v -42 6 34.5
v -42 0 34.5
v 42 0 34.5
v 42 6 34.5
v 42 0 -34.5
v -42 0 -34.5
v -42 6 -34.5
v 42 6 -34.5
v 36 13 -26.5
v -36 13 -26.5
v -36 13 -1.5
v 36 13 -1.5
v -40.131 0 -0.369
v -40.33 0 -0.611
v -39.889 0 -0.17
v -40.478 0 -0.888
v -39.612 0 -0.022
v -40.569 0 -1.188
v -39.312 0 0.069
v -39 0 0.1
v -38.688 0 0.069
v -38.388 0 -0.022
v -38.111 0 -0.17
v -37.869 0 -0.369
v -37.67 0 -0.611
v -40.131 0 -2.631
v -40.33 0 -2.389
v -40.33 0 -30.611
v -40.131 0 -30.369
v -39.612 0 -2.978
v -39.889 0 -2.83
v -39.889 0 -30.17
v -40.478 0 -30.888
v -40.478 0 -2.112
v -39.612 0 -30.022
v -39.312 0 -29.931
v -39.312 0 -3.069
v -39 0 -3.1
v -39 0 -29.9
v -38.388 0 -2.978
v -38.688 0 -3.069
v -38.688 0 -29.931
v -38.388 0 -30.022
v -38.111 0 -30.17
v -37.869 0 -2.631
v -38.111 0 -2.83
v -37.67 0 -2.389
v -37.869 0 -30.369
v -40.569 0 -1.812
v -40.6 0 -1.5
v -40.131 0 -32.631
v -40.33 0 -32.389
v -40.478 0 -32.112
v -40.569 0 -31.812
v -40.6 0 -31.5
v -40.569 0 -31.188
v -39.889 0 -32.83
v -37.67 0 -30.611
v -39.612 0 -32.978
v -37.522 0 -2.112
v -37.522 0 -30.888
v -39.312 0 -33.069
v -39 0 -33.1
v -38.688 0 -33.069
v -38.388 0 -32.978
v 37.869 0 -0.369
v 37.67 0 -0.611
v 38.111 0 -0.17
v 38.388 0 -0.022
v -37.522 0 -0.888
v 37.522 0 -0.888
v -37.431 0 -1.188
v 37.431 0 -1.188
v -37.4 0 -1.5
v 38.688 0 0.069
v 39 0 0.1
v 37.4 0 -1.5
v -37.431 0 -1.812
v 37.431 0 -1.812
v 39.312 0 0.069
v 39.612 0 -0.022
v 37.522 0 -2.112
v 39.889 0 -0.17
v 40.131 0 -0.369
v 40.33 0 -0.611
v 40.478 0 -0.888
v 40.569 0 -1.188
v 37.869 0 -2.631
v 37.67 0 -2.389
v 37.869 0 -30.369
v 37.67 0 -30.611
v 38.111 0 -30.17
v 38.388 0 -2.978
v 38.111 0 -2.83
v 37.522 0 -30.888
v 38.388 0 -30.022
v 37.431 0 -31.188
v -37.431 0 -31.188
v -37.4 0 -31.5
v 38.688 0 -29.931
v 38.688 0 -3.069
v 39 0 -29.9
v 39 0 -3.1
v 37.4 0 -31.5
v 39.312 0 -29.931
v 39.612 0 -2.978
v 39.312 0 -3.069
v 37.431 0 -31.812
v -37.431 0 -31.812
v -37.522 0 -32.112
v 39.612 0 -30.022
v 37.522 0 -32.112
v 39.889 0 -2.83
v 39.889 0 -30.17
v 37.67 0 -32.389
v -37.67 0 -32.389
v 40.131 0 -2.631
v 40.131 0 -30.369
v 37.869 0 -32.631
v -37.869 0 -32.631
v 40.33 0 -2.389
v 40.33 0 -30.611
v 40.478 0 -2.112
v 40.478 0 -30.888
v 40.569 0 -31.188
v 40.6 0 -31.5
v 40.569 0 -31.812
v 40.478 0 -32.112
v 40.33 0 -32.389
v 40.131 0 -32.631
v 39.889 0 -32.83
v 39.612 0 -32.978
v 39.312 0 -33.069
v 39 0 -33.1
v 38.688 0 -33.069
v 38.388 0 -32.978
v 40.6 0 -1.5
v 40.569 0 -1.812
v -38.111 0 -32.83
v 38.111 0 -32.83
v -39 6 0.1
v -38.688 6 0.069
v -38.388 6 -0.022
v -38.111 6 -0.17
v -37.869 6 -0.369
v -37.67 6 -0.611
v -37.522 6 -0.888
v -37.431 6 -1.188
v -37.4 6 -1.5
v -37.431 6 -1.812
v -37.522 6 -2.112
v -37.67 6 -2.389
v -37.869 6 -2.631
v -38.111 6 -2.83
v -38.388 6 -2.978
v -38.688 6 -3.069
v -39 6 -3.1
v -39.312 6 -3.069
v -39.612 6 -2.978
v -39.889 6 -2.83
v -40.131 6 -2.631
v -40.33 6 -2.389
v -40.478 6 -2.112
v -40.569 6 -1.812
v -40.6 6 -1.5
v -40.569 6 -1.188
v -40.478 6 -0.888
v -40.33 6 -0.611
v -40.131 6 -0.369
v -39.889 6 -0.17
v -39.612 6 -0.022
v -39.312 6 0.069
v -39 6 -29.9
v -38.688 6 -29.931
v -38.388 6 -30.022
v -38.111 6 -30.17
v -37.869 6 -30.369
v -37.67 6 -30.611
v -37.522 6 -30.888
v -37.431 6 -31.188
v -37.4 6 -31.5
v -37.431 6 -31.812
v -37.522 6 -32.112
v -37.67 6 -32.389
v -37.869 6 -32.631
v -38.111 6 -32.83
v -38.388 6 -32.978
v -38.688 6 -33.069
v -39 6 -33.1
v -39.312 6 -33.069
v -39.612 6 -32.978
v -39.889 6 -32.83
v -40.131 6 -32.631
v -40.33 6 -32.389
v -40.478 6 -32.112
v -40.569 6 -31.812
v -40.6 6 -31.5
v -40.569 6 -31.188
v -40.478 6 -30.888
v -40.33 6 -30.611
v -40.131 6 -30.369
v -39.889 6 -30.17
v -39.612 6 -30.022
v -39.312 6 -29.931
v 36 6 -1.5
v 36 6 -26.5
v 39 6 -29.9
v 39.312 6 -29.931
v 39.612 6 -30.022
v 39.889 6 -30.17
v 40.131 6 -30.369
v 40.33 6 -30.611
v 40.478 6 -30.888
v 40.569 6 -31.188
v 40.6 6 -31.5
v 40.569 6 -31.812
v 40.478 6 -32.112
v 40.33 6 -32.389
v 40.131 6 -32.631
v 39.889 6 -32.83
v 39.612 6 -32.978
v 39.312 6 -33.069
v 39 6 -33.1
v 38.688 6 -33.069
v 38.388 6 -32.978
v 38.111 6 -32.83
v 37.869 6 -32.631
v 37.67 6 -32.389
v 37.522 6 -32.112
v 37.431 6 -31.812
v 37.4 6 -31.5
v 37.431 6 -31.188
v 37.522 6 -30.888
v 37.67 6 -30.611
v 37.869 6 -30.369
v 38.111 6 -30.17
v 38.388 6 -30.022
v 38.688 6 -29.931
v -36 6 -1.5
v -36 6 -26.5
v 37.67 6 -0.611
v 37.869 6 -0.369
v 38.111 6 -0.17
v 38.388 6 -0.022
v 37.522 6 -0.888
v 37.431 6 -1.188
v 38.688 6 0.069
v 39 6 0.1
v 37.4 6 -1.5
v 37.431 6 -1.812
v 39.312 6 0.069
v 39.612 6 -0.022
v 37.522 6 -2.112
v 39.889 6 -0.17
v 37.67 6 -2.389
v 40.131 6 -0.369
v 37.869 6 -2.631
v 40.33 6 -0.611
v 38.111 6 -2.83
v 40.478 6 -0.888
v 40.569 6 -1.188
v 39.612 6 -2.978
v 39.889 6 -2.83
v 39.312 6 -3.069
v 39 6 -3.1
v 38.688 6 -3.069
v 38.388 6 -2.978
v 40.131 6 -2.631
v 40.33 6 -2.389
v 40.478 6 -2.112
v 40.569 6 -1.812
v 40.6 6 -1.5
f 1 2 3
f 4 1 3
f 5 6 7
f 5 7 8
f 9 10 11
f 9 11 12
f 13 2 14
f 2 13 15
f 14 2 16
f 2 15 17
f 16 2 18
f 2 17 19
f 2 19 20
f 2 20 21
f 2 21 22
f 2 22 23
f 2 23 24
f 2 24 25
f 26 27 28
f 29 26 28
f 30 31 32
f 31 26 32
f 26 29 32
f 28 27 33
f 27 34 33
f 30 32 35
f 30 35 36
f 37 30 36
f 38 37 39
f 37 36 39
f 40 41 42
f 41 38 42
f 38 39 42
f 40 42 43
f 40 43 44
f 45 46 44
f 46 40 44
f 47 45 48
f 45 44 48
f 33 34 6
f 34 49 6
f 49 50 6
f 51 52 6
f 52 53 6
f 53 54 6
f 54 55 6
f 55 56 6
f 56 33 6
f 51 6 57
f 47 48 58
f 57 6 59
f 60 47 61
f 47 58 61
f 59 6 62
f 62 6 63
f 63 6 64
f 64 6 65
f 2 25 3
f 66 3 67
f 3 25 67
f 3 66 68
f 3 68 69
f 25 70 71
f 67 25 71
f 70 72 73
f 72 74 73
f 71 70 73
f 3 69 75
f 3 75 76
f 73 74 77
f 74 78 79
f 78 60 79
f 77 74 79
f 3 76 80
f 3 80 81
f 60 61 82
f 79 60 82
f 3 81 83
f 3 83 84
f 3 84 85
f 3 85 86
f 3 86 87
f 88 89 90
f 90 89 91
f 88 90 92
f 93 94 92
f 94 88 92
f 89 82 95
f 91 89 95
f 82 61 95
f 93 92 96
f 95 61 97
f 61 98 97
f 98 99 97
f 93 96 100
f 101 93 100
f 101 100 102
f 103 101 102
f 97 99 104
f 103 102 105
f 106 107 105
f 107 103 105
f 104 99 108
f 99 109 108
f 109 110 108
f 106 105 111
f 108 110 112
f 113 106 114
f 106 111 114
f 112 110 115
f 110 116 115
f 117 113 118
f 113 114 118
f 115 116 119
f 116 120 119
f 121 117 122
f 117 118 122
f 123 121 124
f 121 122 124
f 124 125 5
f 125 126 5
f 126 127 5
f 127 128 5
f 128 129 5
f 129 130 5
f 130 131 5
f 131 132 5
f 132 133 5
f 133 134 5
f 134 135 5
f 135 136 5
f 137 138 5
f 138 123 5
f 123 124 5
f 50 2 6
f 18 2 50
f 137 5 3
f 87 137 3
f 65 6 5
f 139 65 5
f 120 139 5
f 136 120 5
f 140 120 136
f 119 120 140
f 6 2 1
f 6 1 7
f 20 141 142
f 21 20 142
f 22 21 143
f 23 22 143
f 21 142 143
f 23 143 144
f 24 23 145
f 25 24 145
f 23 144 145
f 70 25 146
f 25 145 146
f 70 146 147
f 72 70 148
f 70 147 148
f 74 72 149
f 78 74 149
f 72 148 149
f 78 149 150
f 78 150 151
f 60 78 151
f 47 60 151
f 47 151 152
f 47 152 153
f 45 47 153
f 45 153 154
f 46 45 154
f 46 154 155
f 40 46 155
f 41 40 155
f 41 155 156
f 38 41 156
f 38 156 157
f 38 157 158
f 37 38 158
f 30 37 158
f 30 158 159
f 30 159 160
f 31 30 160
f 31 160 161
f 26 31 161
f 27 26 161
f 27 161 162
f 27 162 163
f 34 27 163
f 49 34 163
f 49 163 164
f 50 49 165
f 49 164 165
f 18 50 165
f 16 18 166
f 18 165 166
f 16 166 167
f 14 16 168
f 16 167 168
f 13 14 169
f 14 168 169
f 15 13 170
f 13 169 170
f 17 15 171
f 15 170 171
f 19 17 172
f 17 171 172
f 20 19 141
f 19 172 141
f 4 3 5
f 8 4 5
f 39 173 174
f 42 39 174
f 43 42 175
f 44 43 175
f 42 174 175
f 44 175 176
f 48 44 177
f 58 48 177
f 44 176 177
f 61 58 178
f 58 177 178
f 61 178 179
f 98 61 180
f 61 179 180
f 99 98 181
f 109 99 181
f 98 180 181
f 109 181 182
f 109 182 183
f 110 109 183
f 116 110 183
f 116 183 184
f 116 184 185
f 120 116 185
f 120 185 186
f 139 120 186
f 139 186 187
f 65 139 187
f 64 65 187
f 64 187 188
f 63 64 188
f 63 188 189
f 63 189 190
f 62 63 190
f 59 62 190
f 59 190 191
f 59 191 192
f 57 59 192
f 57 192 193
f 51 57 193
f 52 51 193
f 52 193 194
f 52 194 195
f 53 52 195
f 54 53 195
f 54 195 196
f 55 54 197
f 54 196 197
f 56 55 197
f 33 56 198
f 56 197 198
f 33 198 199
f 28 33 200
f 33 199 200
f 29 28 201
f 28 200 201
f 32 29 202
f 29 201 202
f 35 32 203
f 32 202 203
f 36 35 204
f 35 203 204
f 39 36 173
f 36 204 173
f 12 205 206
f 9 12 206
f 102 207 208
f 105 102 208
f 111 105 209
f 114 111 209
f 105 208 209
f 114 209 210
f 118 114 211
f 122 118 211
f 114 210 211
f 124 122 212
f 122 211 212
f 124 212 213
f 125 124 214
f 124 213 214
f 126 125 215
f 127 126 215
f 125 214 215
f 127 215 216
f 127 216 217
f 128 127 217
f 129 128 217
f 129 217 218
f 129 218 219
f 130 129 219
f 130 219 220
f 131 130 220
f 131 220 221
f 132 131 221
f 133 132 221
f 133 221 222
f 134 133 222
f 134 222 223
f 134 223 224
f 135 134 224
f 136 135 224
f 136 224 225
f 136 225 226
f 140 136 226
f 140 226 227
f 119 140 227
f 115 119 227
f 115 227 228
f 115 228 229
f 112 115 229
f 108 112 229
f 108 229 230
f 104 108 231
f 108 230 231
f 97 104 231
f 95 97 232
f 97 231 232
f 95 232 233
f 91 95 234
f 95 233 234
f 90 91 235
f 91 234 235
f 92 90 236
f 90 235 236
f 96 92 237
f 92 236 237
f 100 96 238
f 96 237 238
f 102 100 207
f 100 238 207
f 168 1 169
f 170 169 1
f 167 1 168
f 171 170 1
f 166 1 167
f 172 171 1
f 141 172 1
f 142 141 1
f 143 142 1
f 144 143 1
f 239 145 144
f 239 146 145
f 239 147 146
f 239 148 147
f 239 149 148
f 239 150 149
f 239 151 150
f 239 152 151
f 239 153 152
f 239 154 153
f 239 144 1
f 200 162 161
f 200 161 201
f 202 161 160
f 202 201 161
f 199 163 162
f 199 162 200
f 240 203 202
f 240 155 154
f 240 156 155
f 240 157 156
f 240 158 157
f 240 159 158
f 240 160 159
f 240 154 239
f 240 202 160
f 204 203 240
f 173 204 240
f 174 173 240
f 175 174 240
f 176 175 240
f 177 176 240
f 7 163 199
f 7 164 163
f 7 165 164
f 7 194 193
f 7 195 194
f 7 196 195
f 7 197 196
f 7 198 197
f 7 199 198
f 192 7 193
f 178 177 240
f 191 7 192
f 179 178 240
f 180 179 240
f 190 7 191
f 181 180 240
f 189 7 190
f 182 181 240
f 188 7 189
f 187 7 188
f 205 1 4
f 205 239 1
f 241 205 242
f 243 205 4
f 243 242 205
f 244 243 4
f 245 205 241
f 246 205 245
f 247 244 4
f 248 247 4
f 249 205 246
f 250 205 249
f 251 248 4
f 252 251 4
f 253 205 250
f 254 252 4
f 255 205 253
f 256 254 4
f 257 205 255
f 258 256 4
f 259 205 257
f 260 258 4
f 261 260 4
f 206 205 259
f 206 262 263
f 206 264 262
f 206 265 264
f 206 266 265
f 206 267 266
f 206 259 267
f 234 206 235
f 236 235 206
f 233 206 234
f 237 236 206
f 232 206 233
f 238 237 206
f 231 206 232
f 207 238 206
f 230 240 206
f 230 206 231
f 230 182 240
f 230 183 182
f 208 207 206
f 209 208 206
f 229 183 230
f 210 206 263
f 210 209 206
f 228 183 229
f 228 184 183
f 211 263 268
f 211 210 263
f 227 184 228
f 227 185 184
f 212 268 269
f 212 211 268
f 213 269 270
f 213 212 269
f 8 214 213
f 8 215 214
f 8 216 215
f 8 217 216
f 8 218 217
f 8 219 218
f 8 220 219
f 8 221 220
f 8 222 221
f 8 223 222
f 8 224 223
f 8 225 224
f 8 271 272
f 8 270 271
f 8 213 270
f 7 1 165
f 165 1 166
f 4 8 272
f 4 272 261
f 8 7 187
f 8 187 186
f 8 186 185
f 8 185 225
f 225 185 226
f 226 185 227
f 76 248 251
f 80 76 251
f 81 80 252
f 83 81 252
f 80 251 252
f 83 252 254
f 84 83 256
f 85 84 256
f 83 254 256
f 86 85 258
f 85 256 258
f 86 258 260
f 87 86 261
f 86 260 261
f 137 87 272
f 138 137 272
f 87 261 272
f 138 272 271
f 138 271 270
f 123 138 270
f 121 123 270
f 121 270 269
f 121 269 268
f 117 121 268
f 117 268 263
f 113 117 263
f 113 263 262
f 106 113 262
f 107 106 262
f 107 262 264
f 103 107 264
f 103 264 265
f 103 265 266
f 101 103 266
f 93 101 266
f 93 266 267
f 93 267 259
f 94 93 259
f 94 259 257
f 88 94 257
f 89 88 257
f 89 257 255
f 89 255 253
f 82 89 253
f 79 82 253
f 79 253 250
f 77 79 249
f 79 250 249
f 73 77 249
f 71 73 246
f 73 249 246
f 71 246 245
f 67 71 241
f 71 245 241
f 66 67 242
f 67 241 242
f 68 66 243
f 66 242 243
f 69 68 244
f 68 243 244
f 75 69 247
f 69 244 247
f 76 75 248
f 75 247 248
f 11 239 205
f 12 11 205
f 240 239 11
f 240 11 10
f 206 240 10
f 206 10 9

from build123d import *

# Parameters (mm, degrees)
SKETCH1_W           = 84
SKETCH1_H           = 69
BOSS_EXTRUDE1_DEPTH = 6
SKETCH2_W           = 72
SKETCH2_H           = 25
BOSS_EXTRUDE2_DEPTH = 7
SKETCH3_R           = 1.6
CUT_EXTRUDE1_DEPTH  = 55.801916025
SKETCH4_R           = 1.6
CUT_EXTRUDE2_DEPTH  = 55.801916025
SKETCH5_R           = 1.6
CUT_EXTRUDE3_DEPTH  = 55.801916025
SKETCH6_R           = 1.6
CUT_EXTRUDE4_DEPTH  = 55.801916025


with BuildPart() as part:
    # Sketch1 → Boss-Extrude1 (new body)
    with BuildSketch(Plane(origin=(0, 0, 0), x_dir=(1, 0, 0), z_dir=(0, 1, 0))):
        Rectangle(SKETCH1_W, SKETCH1_H)
    extrude(amount=BOSS_EXTRUDE1_DEPTH)

    # Sketch2 → Boss-Extrude2 (add)
    with BuildSketch(Plane(origin=(0, 6, 0), x_dir=(1, 0, 0), z_dir=(0, 1, 0))):
        with Locations((0, 14)):
            Rectangle(SKETCH2_W, SKETCH2_H)
    extrude(amount=BOSS_EXTRUDE2_DEPTH)

    # Sketch3 → Cut-Extrude1 (cut, through all)
    with BuildSketch(Plane(origin=(0, 6, 0), x_dir=(1, 0, 0), z_dir=(0, 1, 0))):
        with Locations(Location((-39, 31.5, 0), (0, 0, 270))):
            Circle(SKETCH3_R)
    extrude(amount=-CUT_EXTRUDE1_DEPTH, mode=Mode.SUBTRACT)

    # Sketch4 → Cut-Extrude2 (cut, through all)
    with BuildSketch(Plane(origin=(0, 6, 0), x_dir=(1, 0, 0), z_dir=(0, 1, 0))):
        with Locations(Location((39, 31.5, 0), (0, 0, 270))):
            Circle(SKETCH4_R)
    extrude(amount=-CUT_EXTRUDE2_DEPTH, mode=Mode.SUBTRACT)

    # Sketch5 → Cut-Extrude3 (cut, through all)
    with BuildSketch(Plane(origin=(0, 6, 0), x_dir=(1, 0, 0), z_dir=(0, 1, 0))):
        with Locations(Location((-39, 1.5, 0), (0, 0, 270))):
            Circle(SKETCH5_R)
    extrude(amount=-CUT_EXTRUDE3_DEPTH, mode=Mode.SUBTRACT)

    # Sketch6 → Cut-Extrude4 (cut, through all)
    with BuildSketch(Plane(origin=(0, 6, 0), x_dir=(1, 0, 0), z_dir=(0, 1, 0))):
        with Locations(Location((39, 1.5, 0), (0, 0, 270))):
            Circle(SKETCH6_R)
    extrude(amount=-CUT_EXTRUDE4_DEPTH, mode=Mode.SUBTRACT)


solid = part.part
